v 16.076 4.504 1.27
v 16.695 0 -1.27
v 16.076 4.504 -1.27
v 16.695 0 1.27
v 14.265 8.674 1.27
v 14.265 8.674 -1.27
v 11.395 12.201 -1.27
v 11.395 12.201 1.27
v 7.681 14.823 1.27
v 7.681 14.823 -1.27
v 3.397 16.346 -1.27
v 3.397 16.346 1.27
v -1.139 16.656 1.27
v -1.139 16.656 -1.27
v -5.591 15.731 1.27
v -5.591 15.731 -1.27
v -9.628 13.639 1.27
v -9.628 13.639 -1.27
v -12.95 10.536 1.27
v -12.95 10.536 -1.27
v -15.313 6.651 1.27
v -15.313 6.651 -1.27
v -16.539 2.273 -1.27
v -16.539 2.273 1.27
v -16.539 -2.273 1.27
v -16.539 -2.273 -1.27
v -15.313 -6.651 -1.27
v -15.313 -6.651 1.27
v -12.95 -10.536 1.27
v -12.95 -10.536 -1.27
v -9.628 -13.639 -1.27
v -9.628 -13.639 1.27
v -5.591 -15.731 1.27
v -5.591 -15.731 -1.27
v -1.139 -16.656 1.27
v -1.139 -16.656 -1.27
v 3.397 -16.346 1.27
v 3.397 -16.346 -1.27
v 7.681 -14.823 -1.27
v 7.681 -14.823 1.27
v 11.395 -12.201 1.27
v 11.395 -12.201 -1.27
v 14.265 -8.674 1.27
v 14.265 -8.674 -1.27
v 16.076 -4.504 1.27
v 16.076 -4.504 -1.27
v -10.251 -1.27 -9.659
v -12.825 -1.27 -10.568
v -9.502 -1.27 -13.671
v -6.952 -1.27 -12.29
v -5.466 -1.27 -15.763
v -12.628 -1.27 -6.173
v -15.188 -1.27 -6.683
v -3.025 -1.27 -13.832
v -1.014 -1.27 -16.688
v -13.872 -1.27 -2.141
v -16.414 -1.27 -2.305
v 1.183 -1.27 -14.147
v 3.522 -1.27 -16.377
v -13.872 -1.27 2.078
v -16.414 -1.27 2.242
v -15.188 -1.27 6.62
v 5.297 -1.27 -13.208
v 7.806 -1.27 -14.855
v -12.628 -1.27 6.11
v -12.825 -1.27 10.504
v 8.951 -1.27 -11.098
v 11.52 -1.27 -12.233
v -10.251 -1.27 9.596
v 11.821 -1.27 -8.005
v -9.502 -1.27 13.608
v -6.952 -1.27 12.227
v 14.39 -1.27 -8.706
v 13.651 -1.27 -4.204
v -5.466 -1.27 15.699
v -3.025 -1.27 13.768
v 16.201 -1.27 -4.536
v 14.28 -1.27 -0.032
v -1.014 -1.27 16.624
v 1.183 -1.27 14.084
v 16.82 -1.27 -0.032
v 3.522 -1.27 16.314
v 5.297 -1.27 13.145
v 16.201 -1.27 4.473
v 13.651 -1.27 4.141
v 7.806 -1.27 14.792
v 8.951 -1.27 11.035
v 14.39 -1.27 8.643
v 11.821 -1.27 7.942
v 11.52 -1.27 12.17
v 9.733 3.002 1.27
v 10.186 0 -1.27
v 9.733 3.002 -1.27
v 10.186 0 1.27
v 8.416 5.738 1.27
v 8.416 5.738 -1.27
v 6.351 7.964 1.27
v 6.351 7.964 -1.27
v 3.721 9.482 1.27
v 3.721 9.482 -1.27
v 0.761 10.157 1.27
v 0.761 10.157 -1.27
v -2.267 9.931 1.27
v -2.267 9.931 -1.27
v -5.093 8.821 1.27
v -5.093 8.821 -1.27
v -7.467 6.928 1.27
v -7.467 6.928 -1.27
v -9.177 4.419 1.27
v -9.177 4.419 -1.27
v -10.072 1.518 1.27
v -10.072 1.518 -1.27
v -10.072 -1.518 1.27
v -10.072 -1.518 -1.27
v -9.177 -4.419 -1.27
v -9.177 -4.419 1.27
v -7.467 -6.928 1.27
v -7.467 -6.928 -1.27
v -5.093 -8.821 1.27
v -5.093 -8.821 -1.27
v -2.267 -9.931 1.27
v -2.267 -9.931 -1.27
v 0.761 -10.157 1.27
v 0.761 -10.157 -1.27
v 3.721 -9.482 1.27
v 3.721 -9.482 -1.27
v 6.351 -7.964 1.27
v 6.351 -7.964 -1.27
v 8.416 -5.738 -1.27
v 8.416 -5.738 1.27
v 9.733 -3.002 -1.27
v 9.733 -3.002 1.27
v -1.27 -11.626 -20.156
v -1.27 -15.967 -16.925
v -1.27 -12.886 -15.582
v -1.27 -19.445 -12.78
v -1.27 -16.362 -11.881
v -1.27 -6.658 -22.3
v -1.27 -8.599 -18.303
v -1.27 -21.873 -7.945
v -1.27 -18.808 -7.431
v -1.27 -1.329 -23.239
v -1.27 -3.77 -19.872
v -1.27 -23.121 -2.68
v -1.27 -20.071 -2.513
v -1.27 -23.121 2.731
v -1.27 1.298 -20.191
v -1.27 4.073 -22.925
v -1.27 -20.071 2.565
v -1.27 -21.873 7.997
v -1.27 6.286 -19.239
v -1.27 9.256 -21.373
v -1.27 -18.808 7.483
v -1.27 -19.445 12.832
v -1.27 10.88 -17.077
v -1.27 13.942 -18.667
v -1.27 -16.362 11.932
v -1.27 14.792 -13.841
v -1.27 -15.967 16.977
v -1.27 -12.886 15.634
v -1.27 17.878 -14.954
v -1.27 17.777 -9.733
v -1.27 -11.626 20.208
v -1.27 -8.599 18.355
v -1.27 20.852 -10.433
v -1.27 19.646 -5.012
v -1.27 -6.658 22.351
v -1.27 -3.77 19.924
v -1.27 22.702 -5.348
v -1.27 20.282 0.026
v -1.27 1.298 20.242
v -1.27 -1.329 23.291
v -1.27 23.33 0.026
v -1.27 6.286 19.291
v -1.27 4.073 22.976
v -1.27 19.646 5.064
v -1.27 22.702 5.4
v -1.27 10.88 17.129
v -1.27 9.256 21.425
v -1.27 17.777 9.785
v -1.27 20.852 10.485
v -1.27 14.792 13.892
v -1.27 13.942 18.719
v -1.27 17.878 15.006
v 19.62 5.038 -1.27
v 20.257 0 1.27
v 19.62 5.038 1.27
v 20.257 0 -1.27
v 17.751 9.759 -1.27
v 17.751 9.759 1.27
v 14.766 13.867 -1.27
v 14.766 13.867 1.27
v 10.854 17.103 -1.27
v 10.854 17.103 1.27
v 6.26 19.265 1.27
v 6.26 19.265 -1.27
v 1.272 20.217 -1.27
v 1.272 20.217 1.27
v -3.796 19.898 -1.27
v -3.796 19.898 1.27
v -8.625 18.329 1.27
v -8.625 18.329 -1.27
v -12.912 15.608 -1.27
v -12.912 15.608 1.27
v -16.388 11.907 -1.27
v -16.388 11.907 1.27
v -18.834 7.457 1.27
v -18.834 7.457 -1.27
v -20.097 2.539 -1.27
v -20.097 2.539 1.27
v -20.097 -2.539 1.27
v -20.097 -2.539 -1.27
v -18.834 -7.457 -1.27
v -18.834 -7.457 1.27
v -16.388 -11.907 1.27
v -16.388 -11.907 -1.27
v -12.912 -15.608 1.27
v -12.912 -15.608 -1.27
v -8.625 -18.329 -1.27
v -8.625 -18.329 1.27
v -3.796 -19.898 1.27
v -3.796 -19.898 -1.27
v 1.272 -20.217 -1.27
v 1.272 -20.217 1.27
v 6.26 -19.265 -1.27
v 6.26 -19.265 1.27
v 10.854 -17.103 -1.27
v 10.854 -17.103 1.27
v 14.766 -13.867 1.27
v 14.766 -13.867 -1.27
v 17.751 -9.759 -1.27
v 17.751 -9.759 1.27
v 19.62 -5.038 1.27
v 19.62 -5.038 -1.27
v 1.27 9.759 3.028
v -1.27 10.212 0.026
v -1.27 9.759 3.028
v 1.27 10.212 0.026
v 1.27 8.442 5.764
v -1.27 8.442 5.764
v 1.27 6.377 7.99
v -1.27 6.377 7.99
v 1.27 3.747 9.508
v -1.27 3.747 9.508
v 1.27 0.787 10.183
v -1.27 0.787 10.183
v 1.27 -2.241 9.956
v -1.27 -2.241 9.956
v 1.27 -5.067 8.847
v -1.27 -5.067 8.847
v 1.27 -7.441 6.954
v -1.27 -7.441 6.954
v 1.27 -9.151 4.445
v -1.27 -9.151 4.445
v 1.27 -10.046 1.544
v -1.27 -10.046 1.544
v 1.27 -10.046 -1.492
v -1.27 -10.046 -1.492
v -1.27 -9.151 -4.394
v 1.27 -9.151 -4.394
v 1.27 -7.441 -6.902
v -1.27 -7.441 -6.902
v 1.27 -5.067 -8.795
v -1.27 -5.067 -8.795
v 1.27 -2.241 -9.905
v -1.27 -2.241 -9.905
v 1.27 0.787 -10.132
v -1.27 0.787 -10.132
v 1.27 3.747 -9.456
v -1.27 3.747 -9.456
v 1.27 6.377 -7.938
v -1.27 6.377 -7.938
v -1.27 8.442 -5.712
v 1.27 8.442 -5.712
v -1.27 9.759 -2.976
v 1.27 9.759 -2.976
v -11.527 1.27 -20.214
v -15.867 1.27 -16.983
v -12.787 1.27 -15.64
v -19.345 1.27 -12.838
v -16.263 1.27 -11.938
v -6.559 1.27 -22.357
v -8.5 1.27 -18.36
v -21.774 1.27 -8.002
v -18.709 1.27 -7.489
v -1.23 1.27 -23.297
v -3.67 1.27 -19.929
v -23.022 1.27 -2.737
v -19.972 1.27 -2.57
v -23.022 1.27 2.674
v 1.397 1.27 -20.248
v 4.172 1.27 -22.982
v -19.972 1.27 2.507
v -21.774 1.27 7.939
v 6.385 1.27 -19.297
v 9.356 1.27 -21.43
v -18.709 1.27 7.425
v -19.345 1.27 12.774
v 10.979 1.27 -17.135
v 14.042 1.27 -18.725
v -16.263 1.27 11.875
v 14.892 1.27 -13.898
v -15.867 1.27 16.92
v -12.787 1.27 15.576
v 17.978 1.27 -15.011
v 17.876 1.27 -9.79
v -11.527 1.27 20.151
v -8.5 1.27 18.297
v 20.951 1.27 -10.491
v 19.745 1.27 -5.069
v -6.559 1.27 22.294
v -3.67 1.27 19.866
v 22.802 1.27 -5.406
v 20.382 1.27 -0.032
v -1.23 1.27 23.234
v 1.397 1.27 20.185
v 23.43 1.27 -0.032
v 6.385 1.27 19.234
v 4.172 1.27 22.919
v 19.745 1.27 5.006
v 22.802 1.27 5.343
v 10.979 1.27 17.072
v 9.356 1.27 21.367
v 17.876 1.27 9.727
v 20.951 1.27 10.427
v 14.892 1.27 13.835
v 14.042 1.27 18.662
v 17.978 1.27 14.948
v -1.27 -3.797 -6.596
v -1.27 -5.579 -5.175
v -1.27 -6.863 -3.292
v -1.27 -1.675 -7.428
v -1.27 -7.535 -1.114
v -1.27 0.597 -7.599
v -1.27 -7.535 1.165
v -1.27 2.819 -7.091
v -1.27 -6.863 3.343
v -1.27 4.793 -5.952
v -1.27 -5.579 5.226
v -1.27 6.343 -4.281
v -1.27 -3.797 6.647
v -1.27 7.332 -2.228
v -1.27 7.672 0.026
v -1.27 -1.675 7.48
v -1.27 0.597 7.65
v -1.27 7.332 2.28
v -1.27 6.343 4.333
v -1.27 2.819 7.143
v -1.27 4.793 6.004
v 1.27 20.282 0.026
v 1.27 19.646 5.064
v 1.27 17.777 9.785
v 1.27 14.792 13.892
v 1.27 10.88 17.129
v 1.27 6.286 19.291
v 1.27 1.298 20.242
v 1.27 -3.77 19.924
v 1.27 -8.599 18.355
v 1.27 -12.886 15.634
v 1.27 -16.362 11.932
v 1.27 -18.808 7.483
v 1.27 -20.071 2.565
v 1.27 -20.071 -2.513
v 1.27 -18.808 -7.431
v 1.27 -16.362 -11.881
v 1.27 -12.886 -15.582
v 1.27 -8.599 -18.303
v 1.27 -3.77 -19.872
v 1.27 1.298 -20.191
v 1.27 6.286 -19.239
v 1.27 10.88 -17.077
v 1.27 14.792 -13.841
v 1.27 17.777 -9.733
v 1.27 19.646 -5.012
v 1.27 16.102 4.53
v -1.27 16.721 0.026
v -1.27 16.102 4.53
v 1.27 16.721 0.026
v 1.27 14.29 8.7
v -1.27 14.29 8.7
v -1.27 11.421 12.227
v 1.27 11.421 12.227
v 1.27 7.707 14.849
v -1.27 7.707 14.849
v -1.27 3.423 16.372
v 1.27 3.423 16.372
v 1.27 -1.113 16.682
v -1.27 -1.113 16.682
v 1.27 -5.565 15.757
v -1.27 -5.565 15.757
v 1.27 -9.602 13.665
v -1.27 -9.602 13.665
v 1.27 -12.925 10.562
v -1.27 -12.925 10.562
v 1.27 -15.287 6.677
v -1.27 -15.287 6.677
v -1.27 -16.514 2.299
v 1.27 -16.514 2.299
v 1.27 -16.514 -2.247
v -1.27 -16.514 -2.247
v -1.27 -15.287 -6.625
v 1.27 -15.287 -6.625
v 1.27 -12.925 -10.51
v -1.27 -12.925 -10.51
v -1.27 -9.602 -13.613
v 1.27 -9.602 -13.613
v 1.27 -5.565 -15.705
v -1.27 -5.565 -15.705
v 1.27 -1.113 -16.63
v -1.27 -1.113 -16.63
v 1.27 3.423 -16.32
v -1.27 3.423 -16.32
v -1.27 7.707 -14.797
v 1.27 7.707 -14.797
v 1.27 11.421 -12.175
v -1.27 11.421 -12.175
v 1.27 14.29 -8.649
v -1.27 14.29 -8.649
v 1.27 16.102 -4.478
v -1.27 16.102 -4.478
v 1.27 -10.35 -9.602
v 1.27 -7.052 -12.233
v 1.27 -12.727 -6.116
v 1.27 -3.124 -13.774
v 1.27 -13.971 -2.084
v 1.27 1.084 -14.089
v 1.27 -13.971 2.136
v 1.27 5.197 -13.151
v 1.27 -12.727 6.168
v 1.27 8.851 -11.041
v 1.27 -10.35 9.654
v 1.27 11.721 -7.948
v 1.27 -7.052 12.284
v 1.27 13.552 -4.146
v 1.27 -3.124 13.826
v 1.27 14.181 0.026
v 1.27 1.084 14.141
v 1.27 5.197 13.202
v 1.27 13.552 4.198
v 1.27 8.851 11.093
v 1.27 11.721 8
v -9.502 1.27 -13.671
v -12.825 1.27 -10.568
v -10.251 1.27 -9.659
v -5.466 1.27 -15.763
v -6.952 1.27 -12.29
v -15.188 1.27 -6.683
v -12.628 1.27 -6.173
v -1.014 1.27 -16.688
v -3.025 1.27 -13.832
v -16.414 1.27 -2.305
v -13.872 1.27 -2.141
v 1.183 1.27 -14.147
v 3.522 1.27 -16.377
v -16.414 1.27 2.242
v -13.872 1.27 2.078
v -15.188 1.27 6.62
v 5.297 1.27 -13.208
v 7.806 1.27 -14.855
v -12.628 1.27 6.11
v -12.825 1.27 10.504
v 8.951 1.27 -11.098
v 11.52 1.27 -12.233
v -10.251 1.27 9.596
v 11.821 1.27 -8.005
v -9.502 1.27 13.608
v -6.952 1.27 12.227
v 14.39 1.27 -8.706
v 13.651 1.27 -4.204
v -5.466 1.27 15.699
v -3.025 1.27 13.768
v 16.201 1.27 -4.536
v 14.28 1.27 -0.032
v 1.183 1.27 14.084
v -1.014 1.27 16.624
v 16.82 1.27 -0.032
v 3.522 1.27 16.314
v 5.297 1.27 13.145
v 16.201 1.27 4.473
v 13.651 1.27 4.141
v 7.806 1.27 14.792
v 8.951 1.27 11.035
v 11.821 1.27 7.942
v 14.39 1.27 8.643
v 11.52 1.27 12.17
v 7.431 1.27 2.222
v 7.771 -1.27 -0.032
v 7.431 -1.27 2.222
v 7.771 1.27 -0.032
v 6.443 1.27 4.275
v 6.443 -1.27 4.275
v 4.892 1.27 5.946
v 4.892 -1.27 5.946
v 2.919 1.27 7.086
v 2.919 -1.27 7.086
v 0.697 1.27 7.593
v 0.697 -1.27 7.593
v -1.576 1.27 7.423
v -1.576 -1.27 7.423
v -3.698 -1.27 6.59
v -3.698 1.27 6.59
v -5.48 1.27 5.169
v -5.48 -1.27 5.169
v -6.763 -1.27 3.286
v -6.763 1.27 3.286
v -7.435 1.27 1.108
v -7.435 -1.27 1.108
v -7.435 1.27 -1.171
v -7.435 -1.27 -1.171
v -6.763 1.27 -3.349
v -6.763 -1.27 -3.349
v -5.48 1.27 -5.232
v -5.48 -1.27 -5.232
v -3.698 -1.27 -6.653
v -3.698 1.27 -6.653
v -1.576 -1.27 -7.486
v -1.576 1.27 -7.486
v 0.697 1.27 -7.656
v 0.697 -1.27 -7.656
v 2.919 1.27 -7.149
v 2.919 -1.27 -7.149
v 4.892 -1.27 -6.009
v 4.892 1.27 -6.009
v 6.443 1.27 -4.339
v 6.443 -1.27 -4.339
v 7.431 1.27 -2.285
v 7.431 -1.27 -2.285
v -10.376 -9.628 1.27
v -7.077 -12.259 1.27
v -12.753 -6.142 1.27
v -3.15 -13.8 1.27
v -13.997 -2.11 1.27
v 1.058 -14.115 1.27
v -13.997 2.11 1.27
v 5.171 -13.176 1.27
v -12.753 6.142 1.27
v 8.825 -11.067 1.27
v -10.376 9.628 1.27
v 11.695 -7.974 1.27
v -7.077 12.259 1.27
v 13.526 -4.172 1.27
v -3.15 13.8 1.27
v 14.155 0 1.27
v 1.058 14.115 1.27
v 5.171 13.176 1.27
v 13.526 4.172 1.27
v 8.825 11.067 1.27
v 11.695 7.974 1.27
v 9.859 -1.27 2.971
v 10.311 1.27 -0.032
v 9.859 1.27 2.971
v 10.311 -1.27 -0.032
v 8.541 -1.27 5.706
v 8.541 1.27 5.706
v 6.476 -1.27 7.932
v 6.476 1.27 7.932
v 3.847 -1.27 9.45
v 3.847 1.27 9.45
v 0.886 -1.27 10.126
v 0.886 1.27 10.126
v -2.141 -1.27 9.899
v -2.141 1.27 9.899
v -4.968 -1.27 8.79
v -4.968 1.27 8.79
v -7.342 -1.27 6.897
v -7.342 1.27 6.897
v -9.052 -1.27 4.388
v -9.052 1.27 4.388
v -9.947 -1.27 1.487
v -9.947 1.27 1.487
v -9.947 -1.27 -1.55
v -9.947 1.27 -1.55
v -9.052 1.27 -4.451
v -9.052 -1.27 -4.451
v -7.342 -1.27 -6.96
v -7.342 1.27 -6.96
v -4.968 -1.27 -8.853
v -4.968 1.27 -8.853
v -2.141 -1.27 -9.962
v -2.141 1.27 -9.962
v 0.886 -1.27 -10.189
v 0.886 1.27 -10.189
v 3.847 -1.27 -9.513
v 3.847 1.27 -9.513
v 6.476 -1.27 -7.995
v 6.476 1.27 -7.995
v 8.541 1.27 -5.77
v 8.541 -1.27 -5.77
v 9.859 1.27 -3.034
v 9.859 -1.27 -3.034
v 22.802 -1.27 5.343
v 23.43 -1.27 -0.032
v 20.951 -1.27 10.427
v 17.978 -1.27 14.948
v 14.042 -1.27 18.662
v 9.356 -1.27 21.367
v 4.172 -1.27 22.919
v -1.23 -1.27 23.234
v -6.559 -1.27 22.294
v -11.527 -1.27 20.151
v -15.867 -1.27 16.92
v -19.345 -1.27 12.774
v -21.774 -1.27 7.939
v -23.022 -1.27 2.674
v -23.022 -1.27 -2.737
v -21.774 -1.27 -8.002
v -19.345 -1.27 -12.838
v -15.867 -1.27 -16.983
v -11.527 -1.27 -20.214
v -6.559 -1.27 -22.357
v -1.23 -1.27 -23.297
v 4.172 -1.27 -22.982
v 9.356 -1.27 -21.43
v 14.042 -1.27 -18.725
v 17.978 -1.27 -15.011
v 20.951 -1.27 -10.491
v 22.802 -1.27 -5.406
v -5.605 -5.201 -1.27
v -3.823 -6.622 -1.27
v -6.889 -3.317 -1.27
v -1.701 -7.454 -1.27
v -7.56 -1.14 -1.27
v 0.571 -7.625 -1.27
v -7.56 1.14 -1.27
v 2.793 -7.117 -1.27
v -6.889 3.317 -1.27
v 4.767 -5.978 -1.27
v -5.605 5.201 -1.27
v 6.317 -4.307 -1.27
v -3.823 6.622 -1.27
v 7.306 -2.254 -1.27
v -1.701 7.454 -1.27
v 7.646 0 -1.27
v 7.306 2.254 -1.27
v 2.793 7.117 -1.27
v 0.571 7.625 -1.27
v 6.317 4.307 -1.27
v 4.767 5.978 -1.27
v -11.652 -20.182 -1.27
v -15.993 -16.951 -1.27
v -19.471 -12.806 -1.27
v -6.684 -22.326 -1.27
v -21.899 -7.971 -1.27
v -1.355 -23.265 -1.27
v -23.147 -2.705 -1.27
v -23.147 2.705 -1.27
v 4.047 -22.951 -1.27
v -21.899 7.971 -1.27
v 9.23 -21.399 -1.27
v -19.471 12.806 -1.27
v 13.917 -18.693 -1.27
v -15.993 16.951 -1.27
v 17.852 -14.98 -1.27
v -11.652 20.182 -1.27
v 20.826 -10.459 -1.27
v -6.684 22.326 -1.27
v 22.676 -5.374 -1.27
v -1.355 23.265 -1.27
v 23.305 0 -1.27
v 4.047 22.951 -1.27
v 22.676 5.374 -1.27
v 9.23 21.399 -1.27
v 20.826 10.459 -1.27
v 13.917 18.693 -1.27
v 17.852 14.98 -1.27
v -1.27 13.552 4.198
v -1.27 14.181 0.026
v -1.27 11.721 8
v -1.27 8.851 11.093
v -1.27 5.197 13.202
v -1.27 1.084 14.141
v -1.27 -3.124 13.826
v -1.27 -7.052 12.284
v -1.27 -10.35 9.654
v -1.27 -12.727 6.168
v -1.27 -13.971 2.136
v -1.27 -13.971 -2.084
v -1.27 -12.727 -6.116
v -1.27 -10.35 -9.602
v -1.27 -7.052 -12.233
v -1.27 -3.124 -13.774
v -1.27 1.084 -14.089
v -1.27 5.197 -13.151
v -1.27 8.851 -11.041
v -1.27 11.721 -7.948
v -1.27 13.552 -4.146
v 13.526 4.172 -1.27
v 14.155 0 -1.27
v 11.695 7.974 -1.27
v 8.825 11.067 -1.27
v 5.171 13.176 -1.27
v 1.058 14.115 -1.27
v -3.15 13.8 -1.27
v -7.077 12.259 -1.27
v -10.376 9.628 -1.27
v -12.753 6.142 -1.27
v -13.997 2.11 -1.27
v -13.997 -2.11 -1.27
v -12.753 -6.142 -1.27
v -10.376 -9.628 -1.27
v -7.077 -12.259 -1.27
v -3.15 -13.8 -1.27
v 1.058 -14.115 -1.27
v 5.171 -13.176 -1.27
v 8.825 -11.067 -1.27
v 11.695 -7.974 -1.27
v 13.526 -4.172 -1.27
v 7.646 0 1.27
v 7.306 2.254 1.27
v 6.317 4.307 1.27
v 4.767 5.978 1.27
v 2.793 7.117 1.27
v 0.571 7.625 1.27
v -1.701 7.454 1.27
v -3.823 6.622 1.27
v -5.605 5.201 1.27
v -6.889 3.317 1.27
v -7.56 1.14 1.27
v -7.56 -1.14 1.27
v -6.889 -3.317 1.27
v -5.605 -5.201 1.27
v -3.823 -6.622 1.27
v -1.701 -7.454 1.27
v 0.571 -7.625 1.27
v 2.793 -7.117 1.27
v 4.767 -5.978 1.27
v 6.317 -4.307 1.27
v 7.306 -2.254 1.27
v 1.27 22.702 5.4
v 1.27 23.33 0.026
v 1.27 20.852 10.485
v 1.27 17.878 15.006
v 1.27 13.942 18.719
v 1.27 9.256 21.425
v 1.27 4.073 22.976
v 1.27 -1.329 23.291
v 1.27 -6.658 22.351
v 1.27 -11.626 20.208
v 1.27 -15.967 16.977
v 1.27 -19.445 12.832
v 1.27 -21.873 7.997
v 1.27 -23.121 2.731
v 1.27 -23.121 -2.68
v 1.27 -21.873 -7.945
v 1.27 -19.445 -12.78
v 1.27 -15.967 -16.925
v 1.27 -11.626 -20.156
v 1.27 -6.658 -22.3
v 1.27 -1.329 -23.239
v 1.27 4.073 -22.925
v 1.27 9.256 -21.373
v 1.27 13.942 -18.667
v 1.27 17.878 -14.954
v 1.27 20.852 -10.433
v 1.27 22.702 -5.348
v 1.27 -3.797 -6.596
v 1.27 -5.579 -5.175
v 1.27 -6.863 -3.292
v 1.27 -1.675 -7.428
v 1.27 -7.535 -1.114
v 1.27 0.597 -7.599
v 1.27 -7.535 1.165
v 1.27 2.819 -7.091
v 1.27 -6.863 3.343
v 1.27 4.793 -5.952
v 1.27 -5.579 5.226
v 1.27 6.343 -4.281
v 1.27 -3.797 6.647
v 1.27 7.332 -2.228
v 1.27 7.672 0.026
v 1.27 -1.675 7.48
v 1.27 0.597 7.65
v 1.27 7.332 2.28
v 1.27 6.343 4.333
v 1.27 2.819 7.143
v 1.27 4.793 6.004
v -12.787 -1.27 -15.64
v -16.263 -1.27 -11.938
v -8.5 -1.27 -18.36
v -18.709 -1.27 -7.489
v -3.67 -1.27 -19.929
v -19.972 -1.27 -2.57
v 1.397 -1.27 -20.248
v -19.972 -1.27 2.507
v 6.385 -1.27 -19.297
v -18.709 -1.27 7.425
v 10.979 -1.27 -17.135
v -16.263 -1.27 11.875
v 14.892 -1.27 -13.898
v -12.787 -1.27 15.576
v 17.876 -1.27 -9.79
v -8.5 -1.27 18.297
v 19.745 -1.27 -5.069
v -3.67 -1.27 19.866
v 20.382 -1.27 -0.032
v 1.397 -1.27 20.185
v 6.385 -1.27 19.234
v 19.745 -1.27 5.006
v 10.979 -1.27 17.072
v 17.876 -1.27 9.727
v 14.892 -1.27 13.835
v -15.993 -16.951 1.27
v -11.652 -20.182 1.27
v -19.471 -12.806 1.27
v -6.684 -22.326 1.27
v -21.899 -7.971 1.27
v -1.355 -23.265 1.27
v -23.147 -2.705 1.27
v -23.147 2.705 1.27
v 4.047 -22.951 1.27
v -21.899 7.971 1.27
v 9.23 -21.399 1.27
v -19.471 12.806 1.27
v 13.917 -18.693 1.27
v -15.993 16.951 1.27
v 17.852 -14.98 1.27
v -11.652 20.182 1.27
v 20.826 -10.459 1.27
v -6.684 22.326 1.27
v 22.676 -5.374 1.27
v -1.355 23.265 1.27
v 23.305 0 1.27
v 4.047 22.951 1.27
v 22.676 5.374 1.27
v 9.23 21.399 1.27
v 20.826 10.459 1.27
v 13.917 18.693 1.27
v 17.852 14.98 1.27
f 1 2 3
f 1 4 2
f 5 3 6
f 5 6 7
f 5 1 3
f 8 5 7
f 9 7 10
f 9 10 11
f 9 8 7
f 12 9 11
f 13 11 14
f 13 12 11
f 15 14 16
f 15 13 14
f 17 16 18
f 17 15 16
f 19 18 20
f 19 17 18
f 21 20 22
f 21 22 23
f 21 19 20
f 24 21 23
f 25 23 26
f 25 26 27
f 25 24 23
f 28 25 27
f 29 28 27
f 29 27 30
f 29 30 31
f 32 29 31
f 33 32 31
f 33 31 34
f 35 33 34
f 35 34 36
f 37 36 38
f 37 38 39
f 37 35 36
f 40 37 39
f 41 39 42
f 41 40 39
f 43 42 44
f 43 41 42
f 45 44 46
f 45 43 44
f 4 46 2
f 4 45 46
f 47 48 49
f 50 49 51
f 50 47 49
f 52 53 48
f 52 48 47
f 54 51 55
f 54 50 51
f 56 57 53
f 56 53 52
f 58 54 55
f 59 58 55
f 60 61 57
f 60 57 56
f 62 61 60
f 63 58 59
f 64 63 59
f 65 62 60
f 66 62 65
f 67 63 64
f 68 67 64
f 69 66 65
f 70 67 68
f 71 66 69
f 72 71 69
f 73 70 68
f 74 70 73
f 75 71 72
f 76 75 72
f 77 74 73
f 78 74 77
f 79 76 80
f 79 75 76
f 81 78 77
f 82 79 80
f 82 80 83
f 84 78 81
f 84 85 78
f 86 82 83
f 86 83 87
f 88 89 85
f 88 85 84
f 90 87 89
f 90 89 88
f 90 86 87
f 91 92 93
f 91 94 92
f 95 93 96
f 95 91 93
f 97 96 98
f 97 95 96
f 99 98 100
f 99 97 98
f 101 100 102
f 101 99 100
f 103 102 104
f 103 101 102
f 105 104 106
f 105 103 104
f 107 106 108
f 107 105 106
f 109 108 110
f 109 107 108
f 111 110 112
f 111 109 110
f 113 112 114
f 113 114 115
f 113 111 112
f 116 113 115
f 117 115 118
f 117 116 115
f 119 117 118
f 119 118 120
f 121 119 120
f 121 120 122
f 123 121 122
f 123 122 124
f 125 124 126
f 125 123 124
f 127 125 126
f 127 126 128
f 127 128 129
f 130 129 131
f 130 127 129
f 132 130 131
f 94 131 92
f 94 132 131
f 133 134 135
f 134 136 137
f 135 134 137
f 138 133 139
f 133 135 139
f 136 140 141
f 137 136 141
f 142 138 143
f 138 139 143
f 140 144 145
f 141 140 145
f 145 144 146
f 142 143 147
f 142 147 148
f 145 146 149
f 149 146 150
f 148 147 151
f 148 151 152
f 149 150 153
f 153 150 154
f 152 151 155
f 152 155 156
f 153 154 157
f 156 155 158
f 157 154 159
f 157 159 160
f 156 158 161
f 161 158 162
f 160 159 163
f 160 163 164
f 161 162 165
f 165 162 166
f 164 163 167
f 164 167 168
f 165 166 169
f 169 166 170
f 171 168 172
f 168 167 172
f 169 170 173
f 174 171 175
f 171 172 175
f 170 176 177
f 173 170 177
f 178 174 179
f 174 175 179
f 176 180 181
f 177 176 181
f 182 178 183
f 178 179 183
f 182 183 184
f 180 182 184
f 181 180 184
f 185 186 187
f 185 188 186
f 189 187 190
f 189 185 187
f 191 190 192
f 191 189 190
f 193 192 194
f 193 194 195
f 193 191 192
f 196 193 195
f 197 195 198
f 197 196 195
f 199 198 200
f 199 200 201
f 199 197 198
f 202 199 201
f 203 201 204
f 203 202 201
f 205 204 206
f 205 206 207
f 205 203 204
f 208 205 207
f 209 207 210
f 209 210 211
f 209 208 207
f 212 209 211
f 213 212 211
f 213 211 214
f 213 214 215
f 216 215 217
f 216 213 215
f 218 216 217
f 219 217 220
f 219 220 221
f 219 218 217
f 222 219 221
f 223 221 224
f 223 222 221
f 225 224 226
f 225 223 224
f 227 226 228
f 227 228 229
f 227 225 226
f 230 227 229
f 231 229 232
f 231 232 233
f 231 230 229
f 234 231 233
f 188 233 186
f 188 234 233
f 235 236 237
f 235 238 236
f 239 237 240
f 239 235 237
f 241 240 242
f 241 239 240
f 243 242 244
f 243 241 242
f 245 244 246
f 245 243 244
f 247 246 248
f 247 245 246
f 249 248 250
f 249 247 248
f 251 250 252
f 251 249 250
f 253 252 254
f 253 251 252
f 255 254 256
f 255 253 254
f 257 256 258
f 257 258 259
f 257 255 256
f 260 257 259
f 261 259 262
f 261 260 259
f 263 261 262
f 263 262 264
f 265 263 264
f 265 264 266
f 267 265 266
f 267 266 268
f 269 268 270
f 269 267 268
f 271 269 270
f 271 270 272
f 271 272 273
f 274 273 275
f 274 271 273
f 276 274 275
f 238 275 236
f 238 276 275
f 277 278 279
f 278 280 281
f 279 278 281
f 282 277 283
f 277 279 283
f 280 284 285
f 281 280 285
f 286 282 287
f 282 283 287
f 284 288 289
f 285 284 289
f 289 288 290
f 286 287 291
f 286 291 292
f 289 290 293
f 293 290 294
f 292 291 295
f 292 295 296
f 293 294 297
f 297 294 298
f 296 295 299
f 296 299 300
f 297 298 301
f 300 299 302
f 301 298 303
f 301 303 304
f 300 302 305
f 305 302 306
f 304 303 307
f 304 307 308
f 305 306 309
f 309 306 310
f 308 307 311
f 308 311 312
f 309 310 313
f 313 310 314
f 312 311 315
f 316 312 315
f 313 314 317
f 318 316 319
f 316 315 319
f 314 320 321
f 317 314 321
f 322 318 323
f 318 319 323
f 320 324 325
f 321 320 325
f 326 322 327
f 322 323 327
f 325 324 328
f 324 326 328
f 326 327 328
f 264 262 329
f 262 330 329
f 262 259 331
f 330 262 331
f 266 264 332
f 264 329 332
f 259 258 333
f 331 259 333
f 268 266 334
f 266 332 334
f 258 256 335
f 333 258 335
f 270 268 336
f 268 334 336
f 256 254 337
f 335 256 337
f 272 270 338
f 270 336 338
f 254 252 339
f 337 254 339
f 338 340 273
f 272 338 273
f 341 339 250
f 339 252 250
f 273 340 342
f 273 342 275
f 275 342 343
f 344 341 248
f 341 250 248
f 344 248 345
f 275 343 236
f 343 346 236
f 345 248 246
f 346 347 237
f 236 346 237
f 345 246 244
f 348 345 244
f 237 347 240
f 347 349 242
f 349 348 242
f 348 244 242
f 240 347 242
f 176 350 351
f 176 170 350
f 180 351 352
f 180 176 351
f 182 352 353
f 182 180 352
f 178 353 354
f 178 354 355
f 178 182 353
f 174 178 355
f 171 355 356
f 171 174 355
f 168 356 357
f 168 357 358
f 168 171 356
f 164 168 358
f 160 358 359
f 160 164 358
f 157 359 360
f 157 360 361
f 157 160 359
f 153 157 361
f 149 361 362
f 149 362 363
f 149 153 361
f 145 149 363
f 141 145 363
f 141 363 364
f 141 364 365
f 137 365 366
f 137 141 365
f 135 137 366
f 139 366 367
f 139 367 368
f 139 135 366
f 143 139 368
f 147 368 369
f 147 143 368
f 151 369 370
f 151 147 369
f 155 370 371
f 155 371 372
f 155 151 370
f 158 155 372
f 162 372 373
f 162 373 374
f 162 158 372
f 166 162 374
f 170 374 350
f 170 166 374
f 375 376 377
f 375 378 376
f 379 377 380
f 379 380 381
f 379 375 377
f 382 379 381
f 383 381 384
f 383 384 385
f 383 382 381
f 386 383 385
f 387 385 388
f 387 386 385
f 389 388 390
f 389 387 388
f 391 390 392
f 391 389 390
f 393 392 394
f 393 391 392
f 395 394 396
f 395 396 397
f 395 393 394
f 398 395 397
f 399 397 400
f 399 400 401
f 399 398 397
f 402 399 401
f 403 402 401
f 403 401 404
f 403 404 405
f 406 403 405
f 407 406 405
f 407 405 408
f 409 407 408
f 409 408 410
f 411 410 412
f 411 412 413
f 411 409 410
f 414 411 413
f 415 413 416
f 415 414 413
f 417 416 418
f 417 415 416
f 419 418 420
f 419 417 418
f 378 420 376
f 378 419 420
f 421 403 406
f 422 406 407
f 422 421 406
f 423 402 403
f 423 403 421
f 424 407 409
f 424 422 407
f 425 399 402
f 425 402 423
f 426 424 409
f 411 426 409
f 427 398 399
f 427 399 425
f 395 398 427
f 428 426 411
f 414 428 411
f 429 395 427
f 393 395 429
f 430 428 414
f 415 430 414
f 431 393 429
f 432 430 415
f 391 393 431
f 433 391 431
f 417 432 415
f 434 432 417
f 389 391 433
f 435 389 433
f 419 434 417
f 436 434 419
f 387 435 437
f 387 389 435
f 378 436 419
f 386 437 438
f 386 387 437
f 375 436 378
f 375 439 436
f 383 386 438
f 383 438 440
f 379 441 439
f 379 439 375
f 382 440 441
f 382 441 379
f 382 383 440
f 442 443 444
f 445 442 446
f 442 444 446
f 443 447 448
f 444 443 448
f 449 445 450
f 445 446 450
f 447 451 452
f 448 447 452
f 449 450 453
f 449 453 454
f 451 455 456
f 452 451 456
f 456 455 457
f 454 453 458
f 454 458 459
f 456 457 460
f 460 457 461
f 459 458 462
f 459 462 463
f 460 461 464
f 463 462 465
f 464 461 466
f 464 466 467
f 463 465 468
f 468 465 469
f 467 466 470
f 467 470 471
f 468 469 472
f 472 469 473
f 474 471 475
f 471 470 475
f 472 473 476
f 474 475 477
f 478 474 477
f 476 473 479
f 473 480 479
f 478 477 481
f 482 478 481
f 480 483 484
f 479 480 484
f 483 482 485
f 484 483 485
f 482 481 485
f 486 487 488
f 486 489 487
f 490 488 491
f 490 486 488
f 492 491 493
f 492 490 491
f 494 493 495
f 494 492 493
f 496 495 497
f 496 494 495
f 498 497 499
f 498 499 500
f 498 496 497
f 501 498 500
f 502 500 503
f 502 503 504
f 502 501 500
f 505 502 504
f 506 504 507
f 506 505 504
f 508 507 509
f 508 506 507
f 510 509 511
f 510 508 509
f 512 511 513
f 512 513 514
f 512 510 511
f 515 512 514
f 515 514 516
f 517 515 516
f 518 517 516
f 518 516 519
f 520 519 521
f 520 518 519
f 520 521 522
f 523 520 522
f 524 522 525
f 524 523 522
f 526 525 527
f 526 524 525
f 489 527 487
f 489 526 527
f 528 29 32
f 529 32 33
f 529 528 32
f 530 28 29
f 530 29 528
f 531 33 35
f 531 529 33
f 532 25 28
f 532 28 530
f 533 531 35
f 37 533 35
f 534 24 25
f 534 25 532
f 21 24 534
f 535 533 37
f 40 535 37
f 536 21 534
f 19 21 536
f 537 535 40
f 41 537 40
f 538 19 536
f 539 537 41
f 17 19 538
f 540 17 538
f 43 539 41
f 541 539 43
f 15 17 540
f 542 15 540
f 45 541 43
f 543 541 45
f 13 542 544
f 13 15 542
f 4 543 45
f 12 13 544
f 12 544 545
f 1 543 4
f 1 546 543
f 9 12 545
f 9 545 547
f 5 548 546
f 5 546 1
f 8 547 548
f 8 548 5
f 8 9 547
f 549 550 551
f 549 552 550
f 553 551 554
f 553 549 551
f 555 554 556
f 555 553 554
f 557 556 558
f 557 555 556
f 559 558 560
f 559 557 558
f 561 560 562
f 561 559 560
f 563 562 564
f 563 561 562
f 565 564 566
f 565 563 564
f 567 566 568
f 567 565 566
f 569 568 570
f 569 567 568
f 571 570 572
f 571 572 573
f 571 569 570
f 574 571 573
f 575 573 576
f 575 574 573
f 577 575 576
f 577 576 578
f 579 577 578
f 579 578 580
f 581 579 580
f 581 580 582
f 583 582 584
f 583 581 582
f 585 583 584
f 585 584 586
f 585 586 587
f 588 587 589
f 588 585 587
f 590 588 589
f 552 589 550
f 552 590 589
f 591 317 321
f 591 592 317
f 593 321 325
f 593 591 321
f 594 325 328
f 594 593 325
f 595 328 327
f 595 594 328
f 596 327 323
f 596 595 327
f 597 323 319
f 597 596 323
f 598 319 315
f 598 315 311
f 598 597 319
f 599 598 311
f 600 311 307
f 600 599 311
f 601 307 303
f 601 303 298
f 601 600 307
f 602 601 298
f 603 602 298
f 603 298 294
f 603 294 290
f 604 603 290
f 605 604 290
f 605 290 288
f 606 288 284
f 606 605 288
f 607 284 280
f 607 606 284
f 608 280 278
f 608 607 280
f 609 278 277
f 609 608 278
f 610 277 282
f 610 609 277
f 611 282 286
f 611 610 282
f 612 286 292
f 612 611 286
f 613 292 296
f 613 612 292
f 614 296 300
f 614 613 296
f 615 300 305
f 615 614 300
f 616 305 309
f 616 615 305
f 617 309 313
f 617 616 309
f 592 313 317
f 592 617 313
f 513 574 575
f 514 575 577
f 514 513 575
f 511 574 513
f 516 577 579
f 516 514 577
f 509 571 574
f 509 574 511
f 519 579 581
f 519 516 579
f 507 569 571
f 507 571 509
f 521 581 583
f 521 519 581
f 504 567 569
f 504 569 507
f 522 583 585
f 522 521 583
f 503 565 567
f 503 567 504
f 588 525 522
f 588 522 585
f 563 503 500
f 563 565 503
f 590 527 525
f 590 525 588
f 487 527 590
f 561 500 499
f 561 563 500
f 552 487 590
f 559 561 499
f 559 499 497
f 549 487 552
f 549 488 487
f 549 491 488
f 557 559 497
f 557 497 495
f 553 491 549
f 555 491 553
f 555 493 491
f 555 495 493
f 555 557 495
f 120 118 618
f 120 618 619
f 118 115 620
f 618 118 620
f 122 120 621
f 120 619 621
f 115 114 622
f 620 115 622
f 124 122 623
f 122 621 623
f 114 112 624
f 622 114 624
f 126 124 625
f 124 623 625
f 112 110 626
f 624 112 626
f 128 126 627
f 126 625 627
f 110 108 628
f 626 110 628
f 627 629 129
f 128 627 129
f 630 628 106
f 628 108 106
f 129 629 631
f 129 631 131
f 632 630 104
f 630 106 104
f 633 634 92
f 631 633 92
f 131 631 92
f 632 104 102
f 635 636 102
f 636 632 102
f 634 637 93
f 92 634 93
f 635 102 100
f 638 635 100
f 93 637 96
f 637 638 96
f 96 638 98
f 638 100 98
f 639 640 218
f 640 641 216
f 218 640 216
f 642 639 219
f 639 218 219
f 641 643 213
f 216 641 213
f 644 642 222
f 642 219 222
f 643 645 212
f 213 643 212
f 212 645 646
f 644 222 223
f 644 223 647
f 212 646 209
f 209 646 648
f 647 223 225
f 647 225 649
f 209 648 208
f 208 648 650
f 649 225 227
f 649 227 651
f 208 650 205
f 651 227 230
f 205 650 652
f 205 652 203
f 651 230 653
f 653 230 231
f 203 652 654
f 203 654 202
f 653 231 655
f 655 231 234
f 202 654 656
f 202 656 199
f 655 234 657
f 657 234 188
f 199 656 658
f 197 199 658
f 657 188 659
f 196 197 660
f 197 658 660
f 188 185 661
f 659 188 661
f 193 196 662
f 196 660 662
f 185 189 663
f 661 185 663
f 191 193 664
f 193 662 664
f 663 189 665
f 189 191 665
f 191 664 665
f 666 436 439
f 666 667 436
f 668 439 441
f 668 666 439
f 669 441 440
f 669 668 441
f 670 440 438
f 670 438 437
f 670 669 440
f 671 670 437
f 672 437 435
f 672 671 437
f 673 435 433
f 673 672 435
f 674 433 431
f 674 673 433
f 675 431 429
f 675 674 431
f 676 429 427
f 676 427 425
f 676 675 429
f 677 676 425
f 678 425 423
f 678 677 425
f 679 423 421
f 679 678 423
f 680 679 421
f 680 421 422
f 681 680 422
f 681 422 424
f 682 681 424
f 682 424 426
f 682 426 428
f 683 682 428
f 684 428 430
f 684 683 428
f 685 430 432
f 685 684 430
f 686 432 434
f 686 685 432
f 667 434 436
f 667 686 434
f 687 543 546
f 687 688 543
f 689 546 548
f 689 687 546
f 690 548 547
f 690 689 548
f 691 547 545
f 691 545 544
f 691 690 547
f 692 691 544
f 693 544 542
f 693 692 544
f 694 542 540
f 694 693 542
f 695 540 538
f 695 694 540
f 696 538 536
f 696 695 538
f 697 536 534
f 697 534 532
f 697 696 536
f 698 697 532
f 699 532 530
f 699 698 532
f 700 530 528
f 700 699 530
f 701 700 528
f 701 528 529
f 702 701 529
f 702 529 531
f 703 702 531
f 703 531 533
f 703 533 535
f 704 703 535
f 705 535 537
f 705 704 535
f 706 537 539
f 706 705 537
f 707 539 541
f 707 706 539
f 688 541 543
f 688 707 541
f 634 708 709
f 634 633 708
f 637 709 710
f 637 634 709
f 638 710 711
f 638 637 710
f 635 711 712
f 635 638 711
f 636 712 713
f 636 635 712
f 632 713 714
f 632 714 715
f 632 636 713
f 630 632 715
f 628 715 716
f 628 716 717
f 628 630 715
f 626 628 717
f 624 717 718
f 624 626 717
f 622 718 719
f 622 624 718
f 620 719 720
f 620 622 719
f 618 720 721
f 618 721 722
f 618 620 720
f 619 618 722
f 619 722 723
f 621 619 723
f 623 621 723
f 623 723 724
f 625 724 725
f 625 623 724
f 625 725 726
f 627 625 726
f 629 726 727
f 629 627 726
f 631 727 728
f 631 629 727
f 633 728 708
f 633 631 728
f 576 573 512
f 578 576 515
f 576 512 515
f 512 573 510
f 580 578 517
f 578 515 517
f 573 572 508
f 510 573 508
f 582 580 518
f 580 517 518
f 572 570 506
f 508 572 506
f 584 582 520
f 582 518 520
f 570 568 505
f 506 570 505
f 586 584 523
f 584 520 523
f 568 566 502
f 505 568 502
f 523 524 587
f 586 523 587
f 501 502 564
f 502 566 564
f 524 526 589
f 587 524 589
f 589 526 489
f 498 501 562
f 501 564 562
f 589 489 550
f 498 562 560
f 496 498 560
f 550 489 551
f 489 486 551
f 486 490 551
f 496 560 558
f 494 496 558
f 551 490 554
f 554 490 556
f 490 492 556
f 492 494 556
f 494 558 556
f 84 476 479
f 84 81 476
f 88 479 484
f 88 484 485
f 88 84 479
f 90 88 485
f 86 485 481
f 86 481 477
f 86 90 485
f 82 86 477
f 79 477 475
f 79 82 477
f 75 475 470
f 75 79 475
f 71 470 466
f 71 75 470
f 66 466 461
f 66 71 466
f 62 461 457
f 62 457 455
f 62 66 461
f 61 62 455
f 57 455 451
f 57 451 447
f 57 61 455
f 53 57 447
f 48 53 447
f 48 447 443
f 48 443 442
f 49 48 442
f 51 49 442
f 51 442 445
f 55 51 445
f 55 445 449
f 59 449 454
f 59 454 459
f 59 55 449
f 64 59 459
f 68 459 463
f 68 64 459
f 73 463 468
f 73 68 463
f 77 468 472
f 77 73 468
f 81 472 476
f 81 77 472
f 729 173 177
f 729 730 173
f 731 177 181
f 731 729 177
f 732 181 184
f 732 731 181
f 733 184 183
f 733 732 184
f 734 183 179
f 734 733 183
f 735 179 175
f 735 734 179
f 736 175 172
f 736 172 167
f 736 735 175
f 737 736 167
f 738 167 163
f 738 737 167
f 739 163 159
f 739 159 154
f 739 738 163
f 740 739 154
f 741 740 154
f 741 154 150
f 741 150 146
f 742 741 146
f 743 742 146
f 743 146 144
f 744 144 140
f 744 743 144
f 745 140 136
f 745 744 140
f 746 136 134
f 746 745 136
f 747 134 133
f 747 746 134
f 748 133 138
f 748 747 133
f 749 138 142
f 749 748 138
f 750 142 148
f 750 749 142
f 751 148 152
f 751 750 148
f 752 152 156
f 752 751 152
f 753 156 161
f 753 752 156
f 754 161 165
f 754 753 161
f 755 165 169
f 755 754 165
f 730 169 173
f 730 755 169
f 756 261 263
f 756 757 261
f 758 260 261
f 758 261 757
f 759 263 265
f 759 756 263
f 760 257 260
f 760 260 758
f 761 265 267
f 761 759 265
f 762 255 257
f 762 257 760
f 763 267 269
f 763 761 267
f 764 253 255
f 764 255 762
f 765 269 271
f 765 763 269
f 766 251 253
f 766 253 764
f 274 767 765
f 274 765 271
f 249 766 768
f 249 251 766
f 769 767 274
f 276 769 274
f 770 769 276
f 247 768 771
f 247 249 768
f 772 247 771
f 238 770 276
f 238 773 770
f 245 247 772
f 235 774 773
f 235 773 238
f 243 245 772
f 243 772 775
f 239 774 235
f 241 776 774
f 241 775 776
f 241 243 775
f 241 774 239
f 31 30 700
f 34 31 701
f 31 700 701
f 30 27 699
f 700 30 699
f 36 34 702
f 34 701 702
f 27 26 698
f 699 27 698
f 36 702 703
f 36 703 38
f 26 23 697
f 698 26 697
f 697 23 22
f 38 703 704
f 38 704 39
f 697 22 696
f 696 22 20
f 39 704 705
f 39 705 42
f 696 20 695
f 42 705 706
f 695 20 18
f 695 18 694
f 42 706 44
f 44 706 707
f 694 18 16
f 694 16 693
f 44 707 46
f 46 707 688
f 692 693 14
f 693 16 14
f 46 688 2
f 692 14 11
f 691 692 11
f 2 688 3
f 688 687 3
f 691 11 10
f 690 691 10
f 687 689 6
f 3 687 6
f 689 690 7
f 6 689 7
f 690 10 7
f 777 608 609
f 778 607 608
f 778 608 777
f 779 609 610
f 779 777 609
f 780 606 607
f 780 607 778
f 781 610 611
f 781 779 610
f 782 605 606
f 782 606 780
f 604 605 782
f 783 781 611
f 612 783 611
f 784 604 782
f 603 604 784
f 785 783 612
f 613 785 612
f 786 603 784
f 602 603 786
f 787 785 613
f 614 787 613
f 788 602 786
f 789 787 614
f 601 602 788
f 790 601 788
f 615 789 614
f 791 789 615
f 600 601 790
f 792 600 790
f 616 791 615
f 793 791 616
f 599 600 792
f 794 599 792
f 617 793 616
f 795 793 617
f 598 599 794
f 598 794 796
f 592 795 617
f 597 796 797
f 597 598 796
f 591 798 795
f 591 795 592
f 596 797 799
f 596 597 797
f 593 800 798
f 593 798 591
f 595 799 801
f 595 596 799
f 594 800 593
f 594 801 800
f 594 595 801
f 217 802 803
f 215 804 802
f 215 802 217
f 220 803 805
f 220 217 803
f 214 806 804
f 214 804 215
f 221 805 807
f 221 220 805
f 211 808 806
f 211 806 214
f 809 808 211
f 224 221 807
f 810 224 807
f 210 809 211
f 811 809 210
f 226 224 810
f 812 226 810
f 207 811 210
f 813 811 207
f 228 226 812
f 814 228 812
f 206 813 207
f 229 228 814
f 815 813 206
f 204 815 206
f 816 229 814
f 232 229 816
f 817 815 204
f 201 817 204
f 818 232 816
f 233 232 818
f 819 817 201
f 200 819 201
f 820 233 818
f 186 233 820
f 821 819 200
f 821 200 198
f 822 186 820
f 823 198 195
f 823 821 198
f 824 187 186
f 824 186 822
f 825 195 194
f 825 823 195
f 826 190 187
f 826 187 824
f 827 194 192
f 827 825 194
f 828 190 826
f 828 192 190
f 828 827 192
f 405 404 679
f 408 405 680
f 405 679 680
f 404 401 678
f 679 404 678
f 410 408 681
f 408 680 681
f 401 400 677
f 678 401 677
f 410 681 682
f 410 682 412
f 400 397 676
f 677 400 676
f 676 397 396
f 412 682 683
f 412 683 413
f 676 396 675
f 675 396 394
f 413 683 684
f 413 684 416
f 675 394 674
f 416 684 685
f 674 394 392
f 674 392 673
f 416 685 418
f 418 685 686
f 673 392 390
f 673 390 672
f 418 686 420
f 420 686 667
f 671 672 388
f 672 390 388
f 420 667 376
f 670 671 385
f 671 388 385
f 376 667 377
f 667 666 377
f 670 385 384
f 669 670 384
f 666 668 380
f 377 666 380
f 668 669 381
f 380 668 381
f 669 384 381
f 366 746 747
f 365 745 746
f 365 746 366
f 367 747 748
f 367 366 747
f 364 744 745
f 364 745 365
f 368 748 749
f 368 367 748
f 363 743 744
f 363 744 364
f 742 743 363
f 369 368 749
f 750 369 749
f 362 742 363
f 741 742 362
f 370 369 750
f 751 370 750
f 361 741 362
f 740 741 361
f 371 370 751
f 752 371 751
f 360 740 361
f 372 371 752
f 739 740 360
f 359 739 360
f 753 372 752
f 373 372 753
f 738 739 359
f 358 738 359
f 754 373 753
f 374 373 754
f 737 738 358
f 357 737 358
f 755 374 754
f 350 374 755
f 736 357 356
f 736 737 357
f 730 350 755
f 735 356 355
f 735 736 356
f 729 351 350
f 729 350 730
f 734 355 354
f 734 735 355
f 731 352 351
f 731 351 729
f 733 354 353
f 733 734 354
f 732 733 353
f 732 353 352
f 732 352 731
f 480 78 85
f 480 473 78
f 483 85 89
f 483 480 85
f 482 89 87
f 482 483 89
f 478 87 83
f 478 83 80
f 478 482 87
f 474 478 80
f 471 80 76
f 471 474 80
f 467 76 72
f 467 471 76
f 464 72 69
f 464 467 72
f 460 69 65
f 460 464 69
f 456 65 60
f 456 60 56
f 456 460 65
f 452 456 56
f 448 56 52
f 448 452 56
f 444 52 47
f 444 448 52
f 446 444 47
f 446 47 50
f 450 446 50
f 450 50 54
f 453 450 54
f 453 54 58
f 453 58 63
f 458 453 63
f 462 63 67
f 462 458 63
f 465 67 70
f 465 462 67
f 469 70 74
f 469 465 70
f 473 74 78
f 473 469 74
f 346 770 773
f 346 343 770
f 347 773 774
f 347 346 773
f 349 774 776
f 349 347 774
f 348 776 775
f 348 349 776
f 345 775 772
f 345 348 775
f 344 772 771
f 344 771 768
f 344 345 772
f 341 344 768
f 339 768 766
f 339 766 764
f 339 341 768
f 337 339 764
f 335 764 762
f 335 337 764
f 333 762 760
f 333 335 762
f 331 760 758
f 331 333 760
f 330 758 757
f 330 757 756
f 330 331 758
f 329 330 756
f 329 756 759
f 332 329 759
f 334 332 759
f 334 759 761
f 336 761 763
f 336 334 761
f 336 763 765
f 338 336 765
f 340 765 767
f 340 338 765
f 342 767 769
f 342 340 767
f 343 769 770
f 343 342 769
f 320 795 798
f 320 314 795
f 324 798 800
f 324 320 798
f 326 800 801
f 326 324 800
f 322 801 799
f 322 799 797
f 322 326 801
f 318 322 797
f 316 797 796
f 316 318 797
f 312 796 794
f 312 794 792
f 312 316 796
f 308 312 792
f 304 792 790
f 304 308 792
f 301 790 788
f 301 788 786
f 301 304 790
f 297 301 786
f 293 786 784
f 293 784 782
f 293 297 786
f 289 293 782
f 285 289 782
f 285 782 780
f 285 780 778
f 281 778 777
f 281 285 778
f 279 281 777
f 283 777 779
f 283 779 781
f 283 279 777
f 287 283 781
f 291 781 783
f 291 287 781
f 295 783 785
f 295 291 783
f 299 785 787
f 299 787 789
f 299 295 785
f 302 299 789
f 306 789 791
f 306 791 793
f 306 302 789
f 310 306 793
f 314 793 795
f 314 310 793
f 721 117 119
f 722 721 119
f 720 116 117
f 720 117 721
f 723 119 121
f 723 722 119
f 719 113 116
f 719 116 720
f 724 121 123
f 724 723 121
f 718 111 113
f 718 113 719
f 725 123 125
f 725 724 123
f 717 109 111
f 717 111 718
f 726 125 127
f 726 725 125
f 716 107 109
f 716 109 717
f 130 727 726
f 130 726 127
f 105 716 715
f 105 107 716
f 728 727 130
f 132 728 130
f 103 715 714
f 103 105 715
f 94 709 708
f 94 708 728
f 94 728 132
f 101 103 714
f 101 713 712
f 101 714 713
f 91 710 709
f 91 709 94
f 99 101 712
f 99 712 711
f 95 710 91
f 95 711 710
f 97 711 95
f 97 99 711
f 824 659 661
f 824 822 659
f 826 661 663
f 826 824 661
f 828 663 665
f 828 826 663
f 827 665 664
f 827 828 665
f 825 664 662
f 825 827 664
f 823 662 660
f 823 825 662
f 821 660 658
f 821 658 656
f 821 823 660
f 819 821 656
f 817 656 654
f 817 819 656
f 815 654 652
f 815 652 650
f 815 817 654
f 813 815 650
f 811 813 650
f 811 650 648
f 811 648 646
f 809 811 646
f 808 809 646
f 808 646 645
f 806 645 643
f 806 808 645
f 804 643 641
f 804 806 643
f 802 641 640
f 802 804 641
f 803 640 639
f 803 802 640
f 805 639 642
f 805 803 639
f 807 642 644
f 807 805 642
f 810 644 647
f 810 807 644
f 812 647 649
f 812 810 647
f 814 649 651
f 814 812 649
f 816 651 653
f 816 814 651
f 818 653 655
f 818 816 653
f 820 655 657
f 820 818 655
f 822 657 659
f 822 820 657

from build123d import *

# Parameters (mm, degrees)
F0_R     = 16.6949720999
F0_R_2   = 14.1549719201
F3_DEPTH = 1.27
F0_R_3   = 23.3045521035
F0_R_4   = 20.2565528229
F0_R_5   = 10.1858982799
F0_R_6   = 7.6458982799
F1_R     = 23.3045521035
F1_R_2   = 20.2565528229
F4_DEPTH = 1.27
F1_R_3   = 16.6949720999
F1_R_4   = 14.1549719201
F1_R_5   = 10.1858982799
F1_R_6   = 7.6458982799
F2_R     = 23.3045521035
F2_R_2   = 20.2565528229
F5_DEPTH = 1.27
F2_R_3   = 16.6949720999
F2_R_4   = 14.1549719201
F2_R_5   = 10.1858982799
F2_R_6   = 7.6458982799


with BuildPart() as f3:
    # F0 (on Top) → F3 (new body, symmetric)
    with BuildSketch(Plane.XY):
        Circle(F0_R)
        Circle(F0_R_2, mode=Mode.SUBTRACT)
    extrude(amount=F3_DEPTH, both=True)


with BuildPart() as f3b:
    # F0 (on Top) → F3, piece 2 (new body, symmetric)
    with BuildSketch(Plane.XY):
        Circle(F0_R_3)
        Circle(F0_R_4, mode=Mode.SUBTRACT)
    extrude(amount=F3_DEPTH, both=True)


with BuildPart() as f3c:
    # F0 (on Top) → F3, piece 3 (new body, symmetric)
    with BuildSketch(Plane.XY):
        Circle(F0_R_5)
        Circle(F0_R_6, mode=Mode.SUBTRACT)
    extrude(amount=F3_DEPTH, both=True)


with BuildPart() as f4:
    # F1 (on Front) → F4 (new body, symmetric)
    with BuildSketch(Plane.XZ):
        with Locations((0.1252256334, -0.0315979123)):
            Circle(F1_R)
        with Locations((0.1252256334, -0.0315979123)):
            Circle(F1_R_2, mode=Mode.SUBTRACT)
    extrude(amount=F4_DEPTH, both=True)


with BuildPart() as f4b:
    # F1 (on Front) → F4, piece 2 (new body, symmetric)
    with BuildSketch(Plane.XZ):
        with Locations((0.1252256334, -0.0315979123)):
            Circle(F1_R_3)
        with Locations((0.1252256334, -0.0315979123)):
            Circle(F1_R_4, mode=Mode.SUBTRACT)
    extrude(amount=F4_DEPTH, both=True)


with BuildPart() as f4c:
    # F1 (on Front) → F4, piece 3 (new body, symmetric)
    with BuildSketch(Plane.XZ):
        with Locations((0.1252256334, -0.0315979123)):
            Circle(F1_R_5)
        with Locations((0.1252256334, -0.0315979123)):
            Circle(F1_R_6, mode=Mode.SUBTRACT)
    extrude(amount=F4_DEPTH, both=True)


with BuildPart() as f5:
    # F2 (on Right) → F5 (new body, symmetric)
    with BuildSketch(Plane.YZ):
        with Locations((0.0259019434, 0.0259019434)):
            Circle(F2_R)
        with Locations((0.0259019434, 0.0259019434)):
            Circle(F2_R_2, mode=Mode.SUBTRACT)
    extrude(amount=F5_DEPTH, both=True)


with BuildPart() as f5b:
    # F2 (on Right) → F5, piece 2 (new body, symmetric)
    with BuildSketch(Plane.YZ):
        with Locations((0.0259019434, 0.0259019434)):
            Circle(F2_R_3)
        with Locations((0.0259019434, 0.0259019434)):
            Circle(F2_R_4, mode=Mode.SUBTRACT)
    extrude(amount=F5_DEPTH, both=True)


with BuildPart() as f5c:
    # F2 (on Right) → F5, piece 3 (new body, symmetric)
    with BuildSketch(Plane.YZ):
        with Locations((0.0259019434, 0.0259019434)):
            Circle(F2_R_5)
        with Locations((0.0259019434, 0.0259019434)):
            Circle(F2_R_6, mode=Mode.SUBTRACT)
    extrude(amount=F5_DEPTH, both=True)


solid = Compound([f3.part, f3b.part, f3c.part, f4.part, f4b.part, f4c.part, f5.part, f5b.part, f5c.part])
